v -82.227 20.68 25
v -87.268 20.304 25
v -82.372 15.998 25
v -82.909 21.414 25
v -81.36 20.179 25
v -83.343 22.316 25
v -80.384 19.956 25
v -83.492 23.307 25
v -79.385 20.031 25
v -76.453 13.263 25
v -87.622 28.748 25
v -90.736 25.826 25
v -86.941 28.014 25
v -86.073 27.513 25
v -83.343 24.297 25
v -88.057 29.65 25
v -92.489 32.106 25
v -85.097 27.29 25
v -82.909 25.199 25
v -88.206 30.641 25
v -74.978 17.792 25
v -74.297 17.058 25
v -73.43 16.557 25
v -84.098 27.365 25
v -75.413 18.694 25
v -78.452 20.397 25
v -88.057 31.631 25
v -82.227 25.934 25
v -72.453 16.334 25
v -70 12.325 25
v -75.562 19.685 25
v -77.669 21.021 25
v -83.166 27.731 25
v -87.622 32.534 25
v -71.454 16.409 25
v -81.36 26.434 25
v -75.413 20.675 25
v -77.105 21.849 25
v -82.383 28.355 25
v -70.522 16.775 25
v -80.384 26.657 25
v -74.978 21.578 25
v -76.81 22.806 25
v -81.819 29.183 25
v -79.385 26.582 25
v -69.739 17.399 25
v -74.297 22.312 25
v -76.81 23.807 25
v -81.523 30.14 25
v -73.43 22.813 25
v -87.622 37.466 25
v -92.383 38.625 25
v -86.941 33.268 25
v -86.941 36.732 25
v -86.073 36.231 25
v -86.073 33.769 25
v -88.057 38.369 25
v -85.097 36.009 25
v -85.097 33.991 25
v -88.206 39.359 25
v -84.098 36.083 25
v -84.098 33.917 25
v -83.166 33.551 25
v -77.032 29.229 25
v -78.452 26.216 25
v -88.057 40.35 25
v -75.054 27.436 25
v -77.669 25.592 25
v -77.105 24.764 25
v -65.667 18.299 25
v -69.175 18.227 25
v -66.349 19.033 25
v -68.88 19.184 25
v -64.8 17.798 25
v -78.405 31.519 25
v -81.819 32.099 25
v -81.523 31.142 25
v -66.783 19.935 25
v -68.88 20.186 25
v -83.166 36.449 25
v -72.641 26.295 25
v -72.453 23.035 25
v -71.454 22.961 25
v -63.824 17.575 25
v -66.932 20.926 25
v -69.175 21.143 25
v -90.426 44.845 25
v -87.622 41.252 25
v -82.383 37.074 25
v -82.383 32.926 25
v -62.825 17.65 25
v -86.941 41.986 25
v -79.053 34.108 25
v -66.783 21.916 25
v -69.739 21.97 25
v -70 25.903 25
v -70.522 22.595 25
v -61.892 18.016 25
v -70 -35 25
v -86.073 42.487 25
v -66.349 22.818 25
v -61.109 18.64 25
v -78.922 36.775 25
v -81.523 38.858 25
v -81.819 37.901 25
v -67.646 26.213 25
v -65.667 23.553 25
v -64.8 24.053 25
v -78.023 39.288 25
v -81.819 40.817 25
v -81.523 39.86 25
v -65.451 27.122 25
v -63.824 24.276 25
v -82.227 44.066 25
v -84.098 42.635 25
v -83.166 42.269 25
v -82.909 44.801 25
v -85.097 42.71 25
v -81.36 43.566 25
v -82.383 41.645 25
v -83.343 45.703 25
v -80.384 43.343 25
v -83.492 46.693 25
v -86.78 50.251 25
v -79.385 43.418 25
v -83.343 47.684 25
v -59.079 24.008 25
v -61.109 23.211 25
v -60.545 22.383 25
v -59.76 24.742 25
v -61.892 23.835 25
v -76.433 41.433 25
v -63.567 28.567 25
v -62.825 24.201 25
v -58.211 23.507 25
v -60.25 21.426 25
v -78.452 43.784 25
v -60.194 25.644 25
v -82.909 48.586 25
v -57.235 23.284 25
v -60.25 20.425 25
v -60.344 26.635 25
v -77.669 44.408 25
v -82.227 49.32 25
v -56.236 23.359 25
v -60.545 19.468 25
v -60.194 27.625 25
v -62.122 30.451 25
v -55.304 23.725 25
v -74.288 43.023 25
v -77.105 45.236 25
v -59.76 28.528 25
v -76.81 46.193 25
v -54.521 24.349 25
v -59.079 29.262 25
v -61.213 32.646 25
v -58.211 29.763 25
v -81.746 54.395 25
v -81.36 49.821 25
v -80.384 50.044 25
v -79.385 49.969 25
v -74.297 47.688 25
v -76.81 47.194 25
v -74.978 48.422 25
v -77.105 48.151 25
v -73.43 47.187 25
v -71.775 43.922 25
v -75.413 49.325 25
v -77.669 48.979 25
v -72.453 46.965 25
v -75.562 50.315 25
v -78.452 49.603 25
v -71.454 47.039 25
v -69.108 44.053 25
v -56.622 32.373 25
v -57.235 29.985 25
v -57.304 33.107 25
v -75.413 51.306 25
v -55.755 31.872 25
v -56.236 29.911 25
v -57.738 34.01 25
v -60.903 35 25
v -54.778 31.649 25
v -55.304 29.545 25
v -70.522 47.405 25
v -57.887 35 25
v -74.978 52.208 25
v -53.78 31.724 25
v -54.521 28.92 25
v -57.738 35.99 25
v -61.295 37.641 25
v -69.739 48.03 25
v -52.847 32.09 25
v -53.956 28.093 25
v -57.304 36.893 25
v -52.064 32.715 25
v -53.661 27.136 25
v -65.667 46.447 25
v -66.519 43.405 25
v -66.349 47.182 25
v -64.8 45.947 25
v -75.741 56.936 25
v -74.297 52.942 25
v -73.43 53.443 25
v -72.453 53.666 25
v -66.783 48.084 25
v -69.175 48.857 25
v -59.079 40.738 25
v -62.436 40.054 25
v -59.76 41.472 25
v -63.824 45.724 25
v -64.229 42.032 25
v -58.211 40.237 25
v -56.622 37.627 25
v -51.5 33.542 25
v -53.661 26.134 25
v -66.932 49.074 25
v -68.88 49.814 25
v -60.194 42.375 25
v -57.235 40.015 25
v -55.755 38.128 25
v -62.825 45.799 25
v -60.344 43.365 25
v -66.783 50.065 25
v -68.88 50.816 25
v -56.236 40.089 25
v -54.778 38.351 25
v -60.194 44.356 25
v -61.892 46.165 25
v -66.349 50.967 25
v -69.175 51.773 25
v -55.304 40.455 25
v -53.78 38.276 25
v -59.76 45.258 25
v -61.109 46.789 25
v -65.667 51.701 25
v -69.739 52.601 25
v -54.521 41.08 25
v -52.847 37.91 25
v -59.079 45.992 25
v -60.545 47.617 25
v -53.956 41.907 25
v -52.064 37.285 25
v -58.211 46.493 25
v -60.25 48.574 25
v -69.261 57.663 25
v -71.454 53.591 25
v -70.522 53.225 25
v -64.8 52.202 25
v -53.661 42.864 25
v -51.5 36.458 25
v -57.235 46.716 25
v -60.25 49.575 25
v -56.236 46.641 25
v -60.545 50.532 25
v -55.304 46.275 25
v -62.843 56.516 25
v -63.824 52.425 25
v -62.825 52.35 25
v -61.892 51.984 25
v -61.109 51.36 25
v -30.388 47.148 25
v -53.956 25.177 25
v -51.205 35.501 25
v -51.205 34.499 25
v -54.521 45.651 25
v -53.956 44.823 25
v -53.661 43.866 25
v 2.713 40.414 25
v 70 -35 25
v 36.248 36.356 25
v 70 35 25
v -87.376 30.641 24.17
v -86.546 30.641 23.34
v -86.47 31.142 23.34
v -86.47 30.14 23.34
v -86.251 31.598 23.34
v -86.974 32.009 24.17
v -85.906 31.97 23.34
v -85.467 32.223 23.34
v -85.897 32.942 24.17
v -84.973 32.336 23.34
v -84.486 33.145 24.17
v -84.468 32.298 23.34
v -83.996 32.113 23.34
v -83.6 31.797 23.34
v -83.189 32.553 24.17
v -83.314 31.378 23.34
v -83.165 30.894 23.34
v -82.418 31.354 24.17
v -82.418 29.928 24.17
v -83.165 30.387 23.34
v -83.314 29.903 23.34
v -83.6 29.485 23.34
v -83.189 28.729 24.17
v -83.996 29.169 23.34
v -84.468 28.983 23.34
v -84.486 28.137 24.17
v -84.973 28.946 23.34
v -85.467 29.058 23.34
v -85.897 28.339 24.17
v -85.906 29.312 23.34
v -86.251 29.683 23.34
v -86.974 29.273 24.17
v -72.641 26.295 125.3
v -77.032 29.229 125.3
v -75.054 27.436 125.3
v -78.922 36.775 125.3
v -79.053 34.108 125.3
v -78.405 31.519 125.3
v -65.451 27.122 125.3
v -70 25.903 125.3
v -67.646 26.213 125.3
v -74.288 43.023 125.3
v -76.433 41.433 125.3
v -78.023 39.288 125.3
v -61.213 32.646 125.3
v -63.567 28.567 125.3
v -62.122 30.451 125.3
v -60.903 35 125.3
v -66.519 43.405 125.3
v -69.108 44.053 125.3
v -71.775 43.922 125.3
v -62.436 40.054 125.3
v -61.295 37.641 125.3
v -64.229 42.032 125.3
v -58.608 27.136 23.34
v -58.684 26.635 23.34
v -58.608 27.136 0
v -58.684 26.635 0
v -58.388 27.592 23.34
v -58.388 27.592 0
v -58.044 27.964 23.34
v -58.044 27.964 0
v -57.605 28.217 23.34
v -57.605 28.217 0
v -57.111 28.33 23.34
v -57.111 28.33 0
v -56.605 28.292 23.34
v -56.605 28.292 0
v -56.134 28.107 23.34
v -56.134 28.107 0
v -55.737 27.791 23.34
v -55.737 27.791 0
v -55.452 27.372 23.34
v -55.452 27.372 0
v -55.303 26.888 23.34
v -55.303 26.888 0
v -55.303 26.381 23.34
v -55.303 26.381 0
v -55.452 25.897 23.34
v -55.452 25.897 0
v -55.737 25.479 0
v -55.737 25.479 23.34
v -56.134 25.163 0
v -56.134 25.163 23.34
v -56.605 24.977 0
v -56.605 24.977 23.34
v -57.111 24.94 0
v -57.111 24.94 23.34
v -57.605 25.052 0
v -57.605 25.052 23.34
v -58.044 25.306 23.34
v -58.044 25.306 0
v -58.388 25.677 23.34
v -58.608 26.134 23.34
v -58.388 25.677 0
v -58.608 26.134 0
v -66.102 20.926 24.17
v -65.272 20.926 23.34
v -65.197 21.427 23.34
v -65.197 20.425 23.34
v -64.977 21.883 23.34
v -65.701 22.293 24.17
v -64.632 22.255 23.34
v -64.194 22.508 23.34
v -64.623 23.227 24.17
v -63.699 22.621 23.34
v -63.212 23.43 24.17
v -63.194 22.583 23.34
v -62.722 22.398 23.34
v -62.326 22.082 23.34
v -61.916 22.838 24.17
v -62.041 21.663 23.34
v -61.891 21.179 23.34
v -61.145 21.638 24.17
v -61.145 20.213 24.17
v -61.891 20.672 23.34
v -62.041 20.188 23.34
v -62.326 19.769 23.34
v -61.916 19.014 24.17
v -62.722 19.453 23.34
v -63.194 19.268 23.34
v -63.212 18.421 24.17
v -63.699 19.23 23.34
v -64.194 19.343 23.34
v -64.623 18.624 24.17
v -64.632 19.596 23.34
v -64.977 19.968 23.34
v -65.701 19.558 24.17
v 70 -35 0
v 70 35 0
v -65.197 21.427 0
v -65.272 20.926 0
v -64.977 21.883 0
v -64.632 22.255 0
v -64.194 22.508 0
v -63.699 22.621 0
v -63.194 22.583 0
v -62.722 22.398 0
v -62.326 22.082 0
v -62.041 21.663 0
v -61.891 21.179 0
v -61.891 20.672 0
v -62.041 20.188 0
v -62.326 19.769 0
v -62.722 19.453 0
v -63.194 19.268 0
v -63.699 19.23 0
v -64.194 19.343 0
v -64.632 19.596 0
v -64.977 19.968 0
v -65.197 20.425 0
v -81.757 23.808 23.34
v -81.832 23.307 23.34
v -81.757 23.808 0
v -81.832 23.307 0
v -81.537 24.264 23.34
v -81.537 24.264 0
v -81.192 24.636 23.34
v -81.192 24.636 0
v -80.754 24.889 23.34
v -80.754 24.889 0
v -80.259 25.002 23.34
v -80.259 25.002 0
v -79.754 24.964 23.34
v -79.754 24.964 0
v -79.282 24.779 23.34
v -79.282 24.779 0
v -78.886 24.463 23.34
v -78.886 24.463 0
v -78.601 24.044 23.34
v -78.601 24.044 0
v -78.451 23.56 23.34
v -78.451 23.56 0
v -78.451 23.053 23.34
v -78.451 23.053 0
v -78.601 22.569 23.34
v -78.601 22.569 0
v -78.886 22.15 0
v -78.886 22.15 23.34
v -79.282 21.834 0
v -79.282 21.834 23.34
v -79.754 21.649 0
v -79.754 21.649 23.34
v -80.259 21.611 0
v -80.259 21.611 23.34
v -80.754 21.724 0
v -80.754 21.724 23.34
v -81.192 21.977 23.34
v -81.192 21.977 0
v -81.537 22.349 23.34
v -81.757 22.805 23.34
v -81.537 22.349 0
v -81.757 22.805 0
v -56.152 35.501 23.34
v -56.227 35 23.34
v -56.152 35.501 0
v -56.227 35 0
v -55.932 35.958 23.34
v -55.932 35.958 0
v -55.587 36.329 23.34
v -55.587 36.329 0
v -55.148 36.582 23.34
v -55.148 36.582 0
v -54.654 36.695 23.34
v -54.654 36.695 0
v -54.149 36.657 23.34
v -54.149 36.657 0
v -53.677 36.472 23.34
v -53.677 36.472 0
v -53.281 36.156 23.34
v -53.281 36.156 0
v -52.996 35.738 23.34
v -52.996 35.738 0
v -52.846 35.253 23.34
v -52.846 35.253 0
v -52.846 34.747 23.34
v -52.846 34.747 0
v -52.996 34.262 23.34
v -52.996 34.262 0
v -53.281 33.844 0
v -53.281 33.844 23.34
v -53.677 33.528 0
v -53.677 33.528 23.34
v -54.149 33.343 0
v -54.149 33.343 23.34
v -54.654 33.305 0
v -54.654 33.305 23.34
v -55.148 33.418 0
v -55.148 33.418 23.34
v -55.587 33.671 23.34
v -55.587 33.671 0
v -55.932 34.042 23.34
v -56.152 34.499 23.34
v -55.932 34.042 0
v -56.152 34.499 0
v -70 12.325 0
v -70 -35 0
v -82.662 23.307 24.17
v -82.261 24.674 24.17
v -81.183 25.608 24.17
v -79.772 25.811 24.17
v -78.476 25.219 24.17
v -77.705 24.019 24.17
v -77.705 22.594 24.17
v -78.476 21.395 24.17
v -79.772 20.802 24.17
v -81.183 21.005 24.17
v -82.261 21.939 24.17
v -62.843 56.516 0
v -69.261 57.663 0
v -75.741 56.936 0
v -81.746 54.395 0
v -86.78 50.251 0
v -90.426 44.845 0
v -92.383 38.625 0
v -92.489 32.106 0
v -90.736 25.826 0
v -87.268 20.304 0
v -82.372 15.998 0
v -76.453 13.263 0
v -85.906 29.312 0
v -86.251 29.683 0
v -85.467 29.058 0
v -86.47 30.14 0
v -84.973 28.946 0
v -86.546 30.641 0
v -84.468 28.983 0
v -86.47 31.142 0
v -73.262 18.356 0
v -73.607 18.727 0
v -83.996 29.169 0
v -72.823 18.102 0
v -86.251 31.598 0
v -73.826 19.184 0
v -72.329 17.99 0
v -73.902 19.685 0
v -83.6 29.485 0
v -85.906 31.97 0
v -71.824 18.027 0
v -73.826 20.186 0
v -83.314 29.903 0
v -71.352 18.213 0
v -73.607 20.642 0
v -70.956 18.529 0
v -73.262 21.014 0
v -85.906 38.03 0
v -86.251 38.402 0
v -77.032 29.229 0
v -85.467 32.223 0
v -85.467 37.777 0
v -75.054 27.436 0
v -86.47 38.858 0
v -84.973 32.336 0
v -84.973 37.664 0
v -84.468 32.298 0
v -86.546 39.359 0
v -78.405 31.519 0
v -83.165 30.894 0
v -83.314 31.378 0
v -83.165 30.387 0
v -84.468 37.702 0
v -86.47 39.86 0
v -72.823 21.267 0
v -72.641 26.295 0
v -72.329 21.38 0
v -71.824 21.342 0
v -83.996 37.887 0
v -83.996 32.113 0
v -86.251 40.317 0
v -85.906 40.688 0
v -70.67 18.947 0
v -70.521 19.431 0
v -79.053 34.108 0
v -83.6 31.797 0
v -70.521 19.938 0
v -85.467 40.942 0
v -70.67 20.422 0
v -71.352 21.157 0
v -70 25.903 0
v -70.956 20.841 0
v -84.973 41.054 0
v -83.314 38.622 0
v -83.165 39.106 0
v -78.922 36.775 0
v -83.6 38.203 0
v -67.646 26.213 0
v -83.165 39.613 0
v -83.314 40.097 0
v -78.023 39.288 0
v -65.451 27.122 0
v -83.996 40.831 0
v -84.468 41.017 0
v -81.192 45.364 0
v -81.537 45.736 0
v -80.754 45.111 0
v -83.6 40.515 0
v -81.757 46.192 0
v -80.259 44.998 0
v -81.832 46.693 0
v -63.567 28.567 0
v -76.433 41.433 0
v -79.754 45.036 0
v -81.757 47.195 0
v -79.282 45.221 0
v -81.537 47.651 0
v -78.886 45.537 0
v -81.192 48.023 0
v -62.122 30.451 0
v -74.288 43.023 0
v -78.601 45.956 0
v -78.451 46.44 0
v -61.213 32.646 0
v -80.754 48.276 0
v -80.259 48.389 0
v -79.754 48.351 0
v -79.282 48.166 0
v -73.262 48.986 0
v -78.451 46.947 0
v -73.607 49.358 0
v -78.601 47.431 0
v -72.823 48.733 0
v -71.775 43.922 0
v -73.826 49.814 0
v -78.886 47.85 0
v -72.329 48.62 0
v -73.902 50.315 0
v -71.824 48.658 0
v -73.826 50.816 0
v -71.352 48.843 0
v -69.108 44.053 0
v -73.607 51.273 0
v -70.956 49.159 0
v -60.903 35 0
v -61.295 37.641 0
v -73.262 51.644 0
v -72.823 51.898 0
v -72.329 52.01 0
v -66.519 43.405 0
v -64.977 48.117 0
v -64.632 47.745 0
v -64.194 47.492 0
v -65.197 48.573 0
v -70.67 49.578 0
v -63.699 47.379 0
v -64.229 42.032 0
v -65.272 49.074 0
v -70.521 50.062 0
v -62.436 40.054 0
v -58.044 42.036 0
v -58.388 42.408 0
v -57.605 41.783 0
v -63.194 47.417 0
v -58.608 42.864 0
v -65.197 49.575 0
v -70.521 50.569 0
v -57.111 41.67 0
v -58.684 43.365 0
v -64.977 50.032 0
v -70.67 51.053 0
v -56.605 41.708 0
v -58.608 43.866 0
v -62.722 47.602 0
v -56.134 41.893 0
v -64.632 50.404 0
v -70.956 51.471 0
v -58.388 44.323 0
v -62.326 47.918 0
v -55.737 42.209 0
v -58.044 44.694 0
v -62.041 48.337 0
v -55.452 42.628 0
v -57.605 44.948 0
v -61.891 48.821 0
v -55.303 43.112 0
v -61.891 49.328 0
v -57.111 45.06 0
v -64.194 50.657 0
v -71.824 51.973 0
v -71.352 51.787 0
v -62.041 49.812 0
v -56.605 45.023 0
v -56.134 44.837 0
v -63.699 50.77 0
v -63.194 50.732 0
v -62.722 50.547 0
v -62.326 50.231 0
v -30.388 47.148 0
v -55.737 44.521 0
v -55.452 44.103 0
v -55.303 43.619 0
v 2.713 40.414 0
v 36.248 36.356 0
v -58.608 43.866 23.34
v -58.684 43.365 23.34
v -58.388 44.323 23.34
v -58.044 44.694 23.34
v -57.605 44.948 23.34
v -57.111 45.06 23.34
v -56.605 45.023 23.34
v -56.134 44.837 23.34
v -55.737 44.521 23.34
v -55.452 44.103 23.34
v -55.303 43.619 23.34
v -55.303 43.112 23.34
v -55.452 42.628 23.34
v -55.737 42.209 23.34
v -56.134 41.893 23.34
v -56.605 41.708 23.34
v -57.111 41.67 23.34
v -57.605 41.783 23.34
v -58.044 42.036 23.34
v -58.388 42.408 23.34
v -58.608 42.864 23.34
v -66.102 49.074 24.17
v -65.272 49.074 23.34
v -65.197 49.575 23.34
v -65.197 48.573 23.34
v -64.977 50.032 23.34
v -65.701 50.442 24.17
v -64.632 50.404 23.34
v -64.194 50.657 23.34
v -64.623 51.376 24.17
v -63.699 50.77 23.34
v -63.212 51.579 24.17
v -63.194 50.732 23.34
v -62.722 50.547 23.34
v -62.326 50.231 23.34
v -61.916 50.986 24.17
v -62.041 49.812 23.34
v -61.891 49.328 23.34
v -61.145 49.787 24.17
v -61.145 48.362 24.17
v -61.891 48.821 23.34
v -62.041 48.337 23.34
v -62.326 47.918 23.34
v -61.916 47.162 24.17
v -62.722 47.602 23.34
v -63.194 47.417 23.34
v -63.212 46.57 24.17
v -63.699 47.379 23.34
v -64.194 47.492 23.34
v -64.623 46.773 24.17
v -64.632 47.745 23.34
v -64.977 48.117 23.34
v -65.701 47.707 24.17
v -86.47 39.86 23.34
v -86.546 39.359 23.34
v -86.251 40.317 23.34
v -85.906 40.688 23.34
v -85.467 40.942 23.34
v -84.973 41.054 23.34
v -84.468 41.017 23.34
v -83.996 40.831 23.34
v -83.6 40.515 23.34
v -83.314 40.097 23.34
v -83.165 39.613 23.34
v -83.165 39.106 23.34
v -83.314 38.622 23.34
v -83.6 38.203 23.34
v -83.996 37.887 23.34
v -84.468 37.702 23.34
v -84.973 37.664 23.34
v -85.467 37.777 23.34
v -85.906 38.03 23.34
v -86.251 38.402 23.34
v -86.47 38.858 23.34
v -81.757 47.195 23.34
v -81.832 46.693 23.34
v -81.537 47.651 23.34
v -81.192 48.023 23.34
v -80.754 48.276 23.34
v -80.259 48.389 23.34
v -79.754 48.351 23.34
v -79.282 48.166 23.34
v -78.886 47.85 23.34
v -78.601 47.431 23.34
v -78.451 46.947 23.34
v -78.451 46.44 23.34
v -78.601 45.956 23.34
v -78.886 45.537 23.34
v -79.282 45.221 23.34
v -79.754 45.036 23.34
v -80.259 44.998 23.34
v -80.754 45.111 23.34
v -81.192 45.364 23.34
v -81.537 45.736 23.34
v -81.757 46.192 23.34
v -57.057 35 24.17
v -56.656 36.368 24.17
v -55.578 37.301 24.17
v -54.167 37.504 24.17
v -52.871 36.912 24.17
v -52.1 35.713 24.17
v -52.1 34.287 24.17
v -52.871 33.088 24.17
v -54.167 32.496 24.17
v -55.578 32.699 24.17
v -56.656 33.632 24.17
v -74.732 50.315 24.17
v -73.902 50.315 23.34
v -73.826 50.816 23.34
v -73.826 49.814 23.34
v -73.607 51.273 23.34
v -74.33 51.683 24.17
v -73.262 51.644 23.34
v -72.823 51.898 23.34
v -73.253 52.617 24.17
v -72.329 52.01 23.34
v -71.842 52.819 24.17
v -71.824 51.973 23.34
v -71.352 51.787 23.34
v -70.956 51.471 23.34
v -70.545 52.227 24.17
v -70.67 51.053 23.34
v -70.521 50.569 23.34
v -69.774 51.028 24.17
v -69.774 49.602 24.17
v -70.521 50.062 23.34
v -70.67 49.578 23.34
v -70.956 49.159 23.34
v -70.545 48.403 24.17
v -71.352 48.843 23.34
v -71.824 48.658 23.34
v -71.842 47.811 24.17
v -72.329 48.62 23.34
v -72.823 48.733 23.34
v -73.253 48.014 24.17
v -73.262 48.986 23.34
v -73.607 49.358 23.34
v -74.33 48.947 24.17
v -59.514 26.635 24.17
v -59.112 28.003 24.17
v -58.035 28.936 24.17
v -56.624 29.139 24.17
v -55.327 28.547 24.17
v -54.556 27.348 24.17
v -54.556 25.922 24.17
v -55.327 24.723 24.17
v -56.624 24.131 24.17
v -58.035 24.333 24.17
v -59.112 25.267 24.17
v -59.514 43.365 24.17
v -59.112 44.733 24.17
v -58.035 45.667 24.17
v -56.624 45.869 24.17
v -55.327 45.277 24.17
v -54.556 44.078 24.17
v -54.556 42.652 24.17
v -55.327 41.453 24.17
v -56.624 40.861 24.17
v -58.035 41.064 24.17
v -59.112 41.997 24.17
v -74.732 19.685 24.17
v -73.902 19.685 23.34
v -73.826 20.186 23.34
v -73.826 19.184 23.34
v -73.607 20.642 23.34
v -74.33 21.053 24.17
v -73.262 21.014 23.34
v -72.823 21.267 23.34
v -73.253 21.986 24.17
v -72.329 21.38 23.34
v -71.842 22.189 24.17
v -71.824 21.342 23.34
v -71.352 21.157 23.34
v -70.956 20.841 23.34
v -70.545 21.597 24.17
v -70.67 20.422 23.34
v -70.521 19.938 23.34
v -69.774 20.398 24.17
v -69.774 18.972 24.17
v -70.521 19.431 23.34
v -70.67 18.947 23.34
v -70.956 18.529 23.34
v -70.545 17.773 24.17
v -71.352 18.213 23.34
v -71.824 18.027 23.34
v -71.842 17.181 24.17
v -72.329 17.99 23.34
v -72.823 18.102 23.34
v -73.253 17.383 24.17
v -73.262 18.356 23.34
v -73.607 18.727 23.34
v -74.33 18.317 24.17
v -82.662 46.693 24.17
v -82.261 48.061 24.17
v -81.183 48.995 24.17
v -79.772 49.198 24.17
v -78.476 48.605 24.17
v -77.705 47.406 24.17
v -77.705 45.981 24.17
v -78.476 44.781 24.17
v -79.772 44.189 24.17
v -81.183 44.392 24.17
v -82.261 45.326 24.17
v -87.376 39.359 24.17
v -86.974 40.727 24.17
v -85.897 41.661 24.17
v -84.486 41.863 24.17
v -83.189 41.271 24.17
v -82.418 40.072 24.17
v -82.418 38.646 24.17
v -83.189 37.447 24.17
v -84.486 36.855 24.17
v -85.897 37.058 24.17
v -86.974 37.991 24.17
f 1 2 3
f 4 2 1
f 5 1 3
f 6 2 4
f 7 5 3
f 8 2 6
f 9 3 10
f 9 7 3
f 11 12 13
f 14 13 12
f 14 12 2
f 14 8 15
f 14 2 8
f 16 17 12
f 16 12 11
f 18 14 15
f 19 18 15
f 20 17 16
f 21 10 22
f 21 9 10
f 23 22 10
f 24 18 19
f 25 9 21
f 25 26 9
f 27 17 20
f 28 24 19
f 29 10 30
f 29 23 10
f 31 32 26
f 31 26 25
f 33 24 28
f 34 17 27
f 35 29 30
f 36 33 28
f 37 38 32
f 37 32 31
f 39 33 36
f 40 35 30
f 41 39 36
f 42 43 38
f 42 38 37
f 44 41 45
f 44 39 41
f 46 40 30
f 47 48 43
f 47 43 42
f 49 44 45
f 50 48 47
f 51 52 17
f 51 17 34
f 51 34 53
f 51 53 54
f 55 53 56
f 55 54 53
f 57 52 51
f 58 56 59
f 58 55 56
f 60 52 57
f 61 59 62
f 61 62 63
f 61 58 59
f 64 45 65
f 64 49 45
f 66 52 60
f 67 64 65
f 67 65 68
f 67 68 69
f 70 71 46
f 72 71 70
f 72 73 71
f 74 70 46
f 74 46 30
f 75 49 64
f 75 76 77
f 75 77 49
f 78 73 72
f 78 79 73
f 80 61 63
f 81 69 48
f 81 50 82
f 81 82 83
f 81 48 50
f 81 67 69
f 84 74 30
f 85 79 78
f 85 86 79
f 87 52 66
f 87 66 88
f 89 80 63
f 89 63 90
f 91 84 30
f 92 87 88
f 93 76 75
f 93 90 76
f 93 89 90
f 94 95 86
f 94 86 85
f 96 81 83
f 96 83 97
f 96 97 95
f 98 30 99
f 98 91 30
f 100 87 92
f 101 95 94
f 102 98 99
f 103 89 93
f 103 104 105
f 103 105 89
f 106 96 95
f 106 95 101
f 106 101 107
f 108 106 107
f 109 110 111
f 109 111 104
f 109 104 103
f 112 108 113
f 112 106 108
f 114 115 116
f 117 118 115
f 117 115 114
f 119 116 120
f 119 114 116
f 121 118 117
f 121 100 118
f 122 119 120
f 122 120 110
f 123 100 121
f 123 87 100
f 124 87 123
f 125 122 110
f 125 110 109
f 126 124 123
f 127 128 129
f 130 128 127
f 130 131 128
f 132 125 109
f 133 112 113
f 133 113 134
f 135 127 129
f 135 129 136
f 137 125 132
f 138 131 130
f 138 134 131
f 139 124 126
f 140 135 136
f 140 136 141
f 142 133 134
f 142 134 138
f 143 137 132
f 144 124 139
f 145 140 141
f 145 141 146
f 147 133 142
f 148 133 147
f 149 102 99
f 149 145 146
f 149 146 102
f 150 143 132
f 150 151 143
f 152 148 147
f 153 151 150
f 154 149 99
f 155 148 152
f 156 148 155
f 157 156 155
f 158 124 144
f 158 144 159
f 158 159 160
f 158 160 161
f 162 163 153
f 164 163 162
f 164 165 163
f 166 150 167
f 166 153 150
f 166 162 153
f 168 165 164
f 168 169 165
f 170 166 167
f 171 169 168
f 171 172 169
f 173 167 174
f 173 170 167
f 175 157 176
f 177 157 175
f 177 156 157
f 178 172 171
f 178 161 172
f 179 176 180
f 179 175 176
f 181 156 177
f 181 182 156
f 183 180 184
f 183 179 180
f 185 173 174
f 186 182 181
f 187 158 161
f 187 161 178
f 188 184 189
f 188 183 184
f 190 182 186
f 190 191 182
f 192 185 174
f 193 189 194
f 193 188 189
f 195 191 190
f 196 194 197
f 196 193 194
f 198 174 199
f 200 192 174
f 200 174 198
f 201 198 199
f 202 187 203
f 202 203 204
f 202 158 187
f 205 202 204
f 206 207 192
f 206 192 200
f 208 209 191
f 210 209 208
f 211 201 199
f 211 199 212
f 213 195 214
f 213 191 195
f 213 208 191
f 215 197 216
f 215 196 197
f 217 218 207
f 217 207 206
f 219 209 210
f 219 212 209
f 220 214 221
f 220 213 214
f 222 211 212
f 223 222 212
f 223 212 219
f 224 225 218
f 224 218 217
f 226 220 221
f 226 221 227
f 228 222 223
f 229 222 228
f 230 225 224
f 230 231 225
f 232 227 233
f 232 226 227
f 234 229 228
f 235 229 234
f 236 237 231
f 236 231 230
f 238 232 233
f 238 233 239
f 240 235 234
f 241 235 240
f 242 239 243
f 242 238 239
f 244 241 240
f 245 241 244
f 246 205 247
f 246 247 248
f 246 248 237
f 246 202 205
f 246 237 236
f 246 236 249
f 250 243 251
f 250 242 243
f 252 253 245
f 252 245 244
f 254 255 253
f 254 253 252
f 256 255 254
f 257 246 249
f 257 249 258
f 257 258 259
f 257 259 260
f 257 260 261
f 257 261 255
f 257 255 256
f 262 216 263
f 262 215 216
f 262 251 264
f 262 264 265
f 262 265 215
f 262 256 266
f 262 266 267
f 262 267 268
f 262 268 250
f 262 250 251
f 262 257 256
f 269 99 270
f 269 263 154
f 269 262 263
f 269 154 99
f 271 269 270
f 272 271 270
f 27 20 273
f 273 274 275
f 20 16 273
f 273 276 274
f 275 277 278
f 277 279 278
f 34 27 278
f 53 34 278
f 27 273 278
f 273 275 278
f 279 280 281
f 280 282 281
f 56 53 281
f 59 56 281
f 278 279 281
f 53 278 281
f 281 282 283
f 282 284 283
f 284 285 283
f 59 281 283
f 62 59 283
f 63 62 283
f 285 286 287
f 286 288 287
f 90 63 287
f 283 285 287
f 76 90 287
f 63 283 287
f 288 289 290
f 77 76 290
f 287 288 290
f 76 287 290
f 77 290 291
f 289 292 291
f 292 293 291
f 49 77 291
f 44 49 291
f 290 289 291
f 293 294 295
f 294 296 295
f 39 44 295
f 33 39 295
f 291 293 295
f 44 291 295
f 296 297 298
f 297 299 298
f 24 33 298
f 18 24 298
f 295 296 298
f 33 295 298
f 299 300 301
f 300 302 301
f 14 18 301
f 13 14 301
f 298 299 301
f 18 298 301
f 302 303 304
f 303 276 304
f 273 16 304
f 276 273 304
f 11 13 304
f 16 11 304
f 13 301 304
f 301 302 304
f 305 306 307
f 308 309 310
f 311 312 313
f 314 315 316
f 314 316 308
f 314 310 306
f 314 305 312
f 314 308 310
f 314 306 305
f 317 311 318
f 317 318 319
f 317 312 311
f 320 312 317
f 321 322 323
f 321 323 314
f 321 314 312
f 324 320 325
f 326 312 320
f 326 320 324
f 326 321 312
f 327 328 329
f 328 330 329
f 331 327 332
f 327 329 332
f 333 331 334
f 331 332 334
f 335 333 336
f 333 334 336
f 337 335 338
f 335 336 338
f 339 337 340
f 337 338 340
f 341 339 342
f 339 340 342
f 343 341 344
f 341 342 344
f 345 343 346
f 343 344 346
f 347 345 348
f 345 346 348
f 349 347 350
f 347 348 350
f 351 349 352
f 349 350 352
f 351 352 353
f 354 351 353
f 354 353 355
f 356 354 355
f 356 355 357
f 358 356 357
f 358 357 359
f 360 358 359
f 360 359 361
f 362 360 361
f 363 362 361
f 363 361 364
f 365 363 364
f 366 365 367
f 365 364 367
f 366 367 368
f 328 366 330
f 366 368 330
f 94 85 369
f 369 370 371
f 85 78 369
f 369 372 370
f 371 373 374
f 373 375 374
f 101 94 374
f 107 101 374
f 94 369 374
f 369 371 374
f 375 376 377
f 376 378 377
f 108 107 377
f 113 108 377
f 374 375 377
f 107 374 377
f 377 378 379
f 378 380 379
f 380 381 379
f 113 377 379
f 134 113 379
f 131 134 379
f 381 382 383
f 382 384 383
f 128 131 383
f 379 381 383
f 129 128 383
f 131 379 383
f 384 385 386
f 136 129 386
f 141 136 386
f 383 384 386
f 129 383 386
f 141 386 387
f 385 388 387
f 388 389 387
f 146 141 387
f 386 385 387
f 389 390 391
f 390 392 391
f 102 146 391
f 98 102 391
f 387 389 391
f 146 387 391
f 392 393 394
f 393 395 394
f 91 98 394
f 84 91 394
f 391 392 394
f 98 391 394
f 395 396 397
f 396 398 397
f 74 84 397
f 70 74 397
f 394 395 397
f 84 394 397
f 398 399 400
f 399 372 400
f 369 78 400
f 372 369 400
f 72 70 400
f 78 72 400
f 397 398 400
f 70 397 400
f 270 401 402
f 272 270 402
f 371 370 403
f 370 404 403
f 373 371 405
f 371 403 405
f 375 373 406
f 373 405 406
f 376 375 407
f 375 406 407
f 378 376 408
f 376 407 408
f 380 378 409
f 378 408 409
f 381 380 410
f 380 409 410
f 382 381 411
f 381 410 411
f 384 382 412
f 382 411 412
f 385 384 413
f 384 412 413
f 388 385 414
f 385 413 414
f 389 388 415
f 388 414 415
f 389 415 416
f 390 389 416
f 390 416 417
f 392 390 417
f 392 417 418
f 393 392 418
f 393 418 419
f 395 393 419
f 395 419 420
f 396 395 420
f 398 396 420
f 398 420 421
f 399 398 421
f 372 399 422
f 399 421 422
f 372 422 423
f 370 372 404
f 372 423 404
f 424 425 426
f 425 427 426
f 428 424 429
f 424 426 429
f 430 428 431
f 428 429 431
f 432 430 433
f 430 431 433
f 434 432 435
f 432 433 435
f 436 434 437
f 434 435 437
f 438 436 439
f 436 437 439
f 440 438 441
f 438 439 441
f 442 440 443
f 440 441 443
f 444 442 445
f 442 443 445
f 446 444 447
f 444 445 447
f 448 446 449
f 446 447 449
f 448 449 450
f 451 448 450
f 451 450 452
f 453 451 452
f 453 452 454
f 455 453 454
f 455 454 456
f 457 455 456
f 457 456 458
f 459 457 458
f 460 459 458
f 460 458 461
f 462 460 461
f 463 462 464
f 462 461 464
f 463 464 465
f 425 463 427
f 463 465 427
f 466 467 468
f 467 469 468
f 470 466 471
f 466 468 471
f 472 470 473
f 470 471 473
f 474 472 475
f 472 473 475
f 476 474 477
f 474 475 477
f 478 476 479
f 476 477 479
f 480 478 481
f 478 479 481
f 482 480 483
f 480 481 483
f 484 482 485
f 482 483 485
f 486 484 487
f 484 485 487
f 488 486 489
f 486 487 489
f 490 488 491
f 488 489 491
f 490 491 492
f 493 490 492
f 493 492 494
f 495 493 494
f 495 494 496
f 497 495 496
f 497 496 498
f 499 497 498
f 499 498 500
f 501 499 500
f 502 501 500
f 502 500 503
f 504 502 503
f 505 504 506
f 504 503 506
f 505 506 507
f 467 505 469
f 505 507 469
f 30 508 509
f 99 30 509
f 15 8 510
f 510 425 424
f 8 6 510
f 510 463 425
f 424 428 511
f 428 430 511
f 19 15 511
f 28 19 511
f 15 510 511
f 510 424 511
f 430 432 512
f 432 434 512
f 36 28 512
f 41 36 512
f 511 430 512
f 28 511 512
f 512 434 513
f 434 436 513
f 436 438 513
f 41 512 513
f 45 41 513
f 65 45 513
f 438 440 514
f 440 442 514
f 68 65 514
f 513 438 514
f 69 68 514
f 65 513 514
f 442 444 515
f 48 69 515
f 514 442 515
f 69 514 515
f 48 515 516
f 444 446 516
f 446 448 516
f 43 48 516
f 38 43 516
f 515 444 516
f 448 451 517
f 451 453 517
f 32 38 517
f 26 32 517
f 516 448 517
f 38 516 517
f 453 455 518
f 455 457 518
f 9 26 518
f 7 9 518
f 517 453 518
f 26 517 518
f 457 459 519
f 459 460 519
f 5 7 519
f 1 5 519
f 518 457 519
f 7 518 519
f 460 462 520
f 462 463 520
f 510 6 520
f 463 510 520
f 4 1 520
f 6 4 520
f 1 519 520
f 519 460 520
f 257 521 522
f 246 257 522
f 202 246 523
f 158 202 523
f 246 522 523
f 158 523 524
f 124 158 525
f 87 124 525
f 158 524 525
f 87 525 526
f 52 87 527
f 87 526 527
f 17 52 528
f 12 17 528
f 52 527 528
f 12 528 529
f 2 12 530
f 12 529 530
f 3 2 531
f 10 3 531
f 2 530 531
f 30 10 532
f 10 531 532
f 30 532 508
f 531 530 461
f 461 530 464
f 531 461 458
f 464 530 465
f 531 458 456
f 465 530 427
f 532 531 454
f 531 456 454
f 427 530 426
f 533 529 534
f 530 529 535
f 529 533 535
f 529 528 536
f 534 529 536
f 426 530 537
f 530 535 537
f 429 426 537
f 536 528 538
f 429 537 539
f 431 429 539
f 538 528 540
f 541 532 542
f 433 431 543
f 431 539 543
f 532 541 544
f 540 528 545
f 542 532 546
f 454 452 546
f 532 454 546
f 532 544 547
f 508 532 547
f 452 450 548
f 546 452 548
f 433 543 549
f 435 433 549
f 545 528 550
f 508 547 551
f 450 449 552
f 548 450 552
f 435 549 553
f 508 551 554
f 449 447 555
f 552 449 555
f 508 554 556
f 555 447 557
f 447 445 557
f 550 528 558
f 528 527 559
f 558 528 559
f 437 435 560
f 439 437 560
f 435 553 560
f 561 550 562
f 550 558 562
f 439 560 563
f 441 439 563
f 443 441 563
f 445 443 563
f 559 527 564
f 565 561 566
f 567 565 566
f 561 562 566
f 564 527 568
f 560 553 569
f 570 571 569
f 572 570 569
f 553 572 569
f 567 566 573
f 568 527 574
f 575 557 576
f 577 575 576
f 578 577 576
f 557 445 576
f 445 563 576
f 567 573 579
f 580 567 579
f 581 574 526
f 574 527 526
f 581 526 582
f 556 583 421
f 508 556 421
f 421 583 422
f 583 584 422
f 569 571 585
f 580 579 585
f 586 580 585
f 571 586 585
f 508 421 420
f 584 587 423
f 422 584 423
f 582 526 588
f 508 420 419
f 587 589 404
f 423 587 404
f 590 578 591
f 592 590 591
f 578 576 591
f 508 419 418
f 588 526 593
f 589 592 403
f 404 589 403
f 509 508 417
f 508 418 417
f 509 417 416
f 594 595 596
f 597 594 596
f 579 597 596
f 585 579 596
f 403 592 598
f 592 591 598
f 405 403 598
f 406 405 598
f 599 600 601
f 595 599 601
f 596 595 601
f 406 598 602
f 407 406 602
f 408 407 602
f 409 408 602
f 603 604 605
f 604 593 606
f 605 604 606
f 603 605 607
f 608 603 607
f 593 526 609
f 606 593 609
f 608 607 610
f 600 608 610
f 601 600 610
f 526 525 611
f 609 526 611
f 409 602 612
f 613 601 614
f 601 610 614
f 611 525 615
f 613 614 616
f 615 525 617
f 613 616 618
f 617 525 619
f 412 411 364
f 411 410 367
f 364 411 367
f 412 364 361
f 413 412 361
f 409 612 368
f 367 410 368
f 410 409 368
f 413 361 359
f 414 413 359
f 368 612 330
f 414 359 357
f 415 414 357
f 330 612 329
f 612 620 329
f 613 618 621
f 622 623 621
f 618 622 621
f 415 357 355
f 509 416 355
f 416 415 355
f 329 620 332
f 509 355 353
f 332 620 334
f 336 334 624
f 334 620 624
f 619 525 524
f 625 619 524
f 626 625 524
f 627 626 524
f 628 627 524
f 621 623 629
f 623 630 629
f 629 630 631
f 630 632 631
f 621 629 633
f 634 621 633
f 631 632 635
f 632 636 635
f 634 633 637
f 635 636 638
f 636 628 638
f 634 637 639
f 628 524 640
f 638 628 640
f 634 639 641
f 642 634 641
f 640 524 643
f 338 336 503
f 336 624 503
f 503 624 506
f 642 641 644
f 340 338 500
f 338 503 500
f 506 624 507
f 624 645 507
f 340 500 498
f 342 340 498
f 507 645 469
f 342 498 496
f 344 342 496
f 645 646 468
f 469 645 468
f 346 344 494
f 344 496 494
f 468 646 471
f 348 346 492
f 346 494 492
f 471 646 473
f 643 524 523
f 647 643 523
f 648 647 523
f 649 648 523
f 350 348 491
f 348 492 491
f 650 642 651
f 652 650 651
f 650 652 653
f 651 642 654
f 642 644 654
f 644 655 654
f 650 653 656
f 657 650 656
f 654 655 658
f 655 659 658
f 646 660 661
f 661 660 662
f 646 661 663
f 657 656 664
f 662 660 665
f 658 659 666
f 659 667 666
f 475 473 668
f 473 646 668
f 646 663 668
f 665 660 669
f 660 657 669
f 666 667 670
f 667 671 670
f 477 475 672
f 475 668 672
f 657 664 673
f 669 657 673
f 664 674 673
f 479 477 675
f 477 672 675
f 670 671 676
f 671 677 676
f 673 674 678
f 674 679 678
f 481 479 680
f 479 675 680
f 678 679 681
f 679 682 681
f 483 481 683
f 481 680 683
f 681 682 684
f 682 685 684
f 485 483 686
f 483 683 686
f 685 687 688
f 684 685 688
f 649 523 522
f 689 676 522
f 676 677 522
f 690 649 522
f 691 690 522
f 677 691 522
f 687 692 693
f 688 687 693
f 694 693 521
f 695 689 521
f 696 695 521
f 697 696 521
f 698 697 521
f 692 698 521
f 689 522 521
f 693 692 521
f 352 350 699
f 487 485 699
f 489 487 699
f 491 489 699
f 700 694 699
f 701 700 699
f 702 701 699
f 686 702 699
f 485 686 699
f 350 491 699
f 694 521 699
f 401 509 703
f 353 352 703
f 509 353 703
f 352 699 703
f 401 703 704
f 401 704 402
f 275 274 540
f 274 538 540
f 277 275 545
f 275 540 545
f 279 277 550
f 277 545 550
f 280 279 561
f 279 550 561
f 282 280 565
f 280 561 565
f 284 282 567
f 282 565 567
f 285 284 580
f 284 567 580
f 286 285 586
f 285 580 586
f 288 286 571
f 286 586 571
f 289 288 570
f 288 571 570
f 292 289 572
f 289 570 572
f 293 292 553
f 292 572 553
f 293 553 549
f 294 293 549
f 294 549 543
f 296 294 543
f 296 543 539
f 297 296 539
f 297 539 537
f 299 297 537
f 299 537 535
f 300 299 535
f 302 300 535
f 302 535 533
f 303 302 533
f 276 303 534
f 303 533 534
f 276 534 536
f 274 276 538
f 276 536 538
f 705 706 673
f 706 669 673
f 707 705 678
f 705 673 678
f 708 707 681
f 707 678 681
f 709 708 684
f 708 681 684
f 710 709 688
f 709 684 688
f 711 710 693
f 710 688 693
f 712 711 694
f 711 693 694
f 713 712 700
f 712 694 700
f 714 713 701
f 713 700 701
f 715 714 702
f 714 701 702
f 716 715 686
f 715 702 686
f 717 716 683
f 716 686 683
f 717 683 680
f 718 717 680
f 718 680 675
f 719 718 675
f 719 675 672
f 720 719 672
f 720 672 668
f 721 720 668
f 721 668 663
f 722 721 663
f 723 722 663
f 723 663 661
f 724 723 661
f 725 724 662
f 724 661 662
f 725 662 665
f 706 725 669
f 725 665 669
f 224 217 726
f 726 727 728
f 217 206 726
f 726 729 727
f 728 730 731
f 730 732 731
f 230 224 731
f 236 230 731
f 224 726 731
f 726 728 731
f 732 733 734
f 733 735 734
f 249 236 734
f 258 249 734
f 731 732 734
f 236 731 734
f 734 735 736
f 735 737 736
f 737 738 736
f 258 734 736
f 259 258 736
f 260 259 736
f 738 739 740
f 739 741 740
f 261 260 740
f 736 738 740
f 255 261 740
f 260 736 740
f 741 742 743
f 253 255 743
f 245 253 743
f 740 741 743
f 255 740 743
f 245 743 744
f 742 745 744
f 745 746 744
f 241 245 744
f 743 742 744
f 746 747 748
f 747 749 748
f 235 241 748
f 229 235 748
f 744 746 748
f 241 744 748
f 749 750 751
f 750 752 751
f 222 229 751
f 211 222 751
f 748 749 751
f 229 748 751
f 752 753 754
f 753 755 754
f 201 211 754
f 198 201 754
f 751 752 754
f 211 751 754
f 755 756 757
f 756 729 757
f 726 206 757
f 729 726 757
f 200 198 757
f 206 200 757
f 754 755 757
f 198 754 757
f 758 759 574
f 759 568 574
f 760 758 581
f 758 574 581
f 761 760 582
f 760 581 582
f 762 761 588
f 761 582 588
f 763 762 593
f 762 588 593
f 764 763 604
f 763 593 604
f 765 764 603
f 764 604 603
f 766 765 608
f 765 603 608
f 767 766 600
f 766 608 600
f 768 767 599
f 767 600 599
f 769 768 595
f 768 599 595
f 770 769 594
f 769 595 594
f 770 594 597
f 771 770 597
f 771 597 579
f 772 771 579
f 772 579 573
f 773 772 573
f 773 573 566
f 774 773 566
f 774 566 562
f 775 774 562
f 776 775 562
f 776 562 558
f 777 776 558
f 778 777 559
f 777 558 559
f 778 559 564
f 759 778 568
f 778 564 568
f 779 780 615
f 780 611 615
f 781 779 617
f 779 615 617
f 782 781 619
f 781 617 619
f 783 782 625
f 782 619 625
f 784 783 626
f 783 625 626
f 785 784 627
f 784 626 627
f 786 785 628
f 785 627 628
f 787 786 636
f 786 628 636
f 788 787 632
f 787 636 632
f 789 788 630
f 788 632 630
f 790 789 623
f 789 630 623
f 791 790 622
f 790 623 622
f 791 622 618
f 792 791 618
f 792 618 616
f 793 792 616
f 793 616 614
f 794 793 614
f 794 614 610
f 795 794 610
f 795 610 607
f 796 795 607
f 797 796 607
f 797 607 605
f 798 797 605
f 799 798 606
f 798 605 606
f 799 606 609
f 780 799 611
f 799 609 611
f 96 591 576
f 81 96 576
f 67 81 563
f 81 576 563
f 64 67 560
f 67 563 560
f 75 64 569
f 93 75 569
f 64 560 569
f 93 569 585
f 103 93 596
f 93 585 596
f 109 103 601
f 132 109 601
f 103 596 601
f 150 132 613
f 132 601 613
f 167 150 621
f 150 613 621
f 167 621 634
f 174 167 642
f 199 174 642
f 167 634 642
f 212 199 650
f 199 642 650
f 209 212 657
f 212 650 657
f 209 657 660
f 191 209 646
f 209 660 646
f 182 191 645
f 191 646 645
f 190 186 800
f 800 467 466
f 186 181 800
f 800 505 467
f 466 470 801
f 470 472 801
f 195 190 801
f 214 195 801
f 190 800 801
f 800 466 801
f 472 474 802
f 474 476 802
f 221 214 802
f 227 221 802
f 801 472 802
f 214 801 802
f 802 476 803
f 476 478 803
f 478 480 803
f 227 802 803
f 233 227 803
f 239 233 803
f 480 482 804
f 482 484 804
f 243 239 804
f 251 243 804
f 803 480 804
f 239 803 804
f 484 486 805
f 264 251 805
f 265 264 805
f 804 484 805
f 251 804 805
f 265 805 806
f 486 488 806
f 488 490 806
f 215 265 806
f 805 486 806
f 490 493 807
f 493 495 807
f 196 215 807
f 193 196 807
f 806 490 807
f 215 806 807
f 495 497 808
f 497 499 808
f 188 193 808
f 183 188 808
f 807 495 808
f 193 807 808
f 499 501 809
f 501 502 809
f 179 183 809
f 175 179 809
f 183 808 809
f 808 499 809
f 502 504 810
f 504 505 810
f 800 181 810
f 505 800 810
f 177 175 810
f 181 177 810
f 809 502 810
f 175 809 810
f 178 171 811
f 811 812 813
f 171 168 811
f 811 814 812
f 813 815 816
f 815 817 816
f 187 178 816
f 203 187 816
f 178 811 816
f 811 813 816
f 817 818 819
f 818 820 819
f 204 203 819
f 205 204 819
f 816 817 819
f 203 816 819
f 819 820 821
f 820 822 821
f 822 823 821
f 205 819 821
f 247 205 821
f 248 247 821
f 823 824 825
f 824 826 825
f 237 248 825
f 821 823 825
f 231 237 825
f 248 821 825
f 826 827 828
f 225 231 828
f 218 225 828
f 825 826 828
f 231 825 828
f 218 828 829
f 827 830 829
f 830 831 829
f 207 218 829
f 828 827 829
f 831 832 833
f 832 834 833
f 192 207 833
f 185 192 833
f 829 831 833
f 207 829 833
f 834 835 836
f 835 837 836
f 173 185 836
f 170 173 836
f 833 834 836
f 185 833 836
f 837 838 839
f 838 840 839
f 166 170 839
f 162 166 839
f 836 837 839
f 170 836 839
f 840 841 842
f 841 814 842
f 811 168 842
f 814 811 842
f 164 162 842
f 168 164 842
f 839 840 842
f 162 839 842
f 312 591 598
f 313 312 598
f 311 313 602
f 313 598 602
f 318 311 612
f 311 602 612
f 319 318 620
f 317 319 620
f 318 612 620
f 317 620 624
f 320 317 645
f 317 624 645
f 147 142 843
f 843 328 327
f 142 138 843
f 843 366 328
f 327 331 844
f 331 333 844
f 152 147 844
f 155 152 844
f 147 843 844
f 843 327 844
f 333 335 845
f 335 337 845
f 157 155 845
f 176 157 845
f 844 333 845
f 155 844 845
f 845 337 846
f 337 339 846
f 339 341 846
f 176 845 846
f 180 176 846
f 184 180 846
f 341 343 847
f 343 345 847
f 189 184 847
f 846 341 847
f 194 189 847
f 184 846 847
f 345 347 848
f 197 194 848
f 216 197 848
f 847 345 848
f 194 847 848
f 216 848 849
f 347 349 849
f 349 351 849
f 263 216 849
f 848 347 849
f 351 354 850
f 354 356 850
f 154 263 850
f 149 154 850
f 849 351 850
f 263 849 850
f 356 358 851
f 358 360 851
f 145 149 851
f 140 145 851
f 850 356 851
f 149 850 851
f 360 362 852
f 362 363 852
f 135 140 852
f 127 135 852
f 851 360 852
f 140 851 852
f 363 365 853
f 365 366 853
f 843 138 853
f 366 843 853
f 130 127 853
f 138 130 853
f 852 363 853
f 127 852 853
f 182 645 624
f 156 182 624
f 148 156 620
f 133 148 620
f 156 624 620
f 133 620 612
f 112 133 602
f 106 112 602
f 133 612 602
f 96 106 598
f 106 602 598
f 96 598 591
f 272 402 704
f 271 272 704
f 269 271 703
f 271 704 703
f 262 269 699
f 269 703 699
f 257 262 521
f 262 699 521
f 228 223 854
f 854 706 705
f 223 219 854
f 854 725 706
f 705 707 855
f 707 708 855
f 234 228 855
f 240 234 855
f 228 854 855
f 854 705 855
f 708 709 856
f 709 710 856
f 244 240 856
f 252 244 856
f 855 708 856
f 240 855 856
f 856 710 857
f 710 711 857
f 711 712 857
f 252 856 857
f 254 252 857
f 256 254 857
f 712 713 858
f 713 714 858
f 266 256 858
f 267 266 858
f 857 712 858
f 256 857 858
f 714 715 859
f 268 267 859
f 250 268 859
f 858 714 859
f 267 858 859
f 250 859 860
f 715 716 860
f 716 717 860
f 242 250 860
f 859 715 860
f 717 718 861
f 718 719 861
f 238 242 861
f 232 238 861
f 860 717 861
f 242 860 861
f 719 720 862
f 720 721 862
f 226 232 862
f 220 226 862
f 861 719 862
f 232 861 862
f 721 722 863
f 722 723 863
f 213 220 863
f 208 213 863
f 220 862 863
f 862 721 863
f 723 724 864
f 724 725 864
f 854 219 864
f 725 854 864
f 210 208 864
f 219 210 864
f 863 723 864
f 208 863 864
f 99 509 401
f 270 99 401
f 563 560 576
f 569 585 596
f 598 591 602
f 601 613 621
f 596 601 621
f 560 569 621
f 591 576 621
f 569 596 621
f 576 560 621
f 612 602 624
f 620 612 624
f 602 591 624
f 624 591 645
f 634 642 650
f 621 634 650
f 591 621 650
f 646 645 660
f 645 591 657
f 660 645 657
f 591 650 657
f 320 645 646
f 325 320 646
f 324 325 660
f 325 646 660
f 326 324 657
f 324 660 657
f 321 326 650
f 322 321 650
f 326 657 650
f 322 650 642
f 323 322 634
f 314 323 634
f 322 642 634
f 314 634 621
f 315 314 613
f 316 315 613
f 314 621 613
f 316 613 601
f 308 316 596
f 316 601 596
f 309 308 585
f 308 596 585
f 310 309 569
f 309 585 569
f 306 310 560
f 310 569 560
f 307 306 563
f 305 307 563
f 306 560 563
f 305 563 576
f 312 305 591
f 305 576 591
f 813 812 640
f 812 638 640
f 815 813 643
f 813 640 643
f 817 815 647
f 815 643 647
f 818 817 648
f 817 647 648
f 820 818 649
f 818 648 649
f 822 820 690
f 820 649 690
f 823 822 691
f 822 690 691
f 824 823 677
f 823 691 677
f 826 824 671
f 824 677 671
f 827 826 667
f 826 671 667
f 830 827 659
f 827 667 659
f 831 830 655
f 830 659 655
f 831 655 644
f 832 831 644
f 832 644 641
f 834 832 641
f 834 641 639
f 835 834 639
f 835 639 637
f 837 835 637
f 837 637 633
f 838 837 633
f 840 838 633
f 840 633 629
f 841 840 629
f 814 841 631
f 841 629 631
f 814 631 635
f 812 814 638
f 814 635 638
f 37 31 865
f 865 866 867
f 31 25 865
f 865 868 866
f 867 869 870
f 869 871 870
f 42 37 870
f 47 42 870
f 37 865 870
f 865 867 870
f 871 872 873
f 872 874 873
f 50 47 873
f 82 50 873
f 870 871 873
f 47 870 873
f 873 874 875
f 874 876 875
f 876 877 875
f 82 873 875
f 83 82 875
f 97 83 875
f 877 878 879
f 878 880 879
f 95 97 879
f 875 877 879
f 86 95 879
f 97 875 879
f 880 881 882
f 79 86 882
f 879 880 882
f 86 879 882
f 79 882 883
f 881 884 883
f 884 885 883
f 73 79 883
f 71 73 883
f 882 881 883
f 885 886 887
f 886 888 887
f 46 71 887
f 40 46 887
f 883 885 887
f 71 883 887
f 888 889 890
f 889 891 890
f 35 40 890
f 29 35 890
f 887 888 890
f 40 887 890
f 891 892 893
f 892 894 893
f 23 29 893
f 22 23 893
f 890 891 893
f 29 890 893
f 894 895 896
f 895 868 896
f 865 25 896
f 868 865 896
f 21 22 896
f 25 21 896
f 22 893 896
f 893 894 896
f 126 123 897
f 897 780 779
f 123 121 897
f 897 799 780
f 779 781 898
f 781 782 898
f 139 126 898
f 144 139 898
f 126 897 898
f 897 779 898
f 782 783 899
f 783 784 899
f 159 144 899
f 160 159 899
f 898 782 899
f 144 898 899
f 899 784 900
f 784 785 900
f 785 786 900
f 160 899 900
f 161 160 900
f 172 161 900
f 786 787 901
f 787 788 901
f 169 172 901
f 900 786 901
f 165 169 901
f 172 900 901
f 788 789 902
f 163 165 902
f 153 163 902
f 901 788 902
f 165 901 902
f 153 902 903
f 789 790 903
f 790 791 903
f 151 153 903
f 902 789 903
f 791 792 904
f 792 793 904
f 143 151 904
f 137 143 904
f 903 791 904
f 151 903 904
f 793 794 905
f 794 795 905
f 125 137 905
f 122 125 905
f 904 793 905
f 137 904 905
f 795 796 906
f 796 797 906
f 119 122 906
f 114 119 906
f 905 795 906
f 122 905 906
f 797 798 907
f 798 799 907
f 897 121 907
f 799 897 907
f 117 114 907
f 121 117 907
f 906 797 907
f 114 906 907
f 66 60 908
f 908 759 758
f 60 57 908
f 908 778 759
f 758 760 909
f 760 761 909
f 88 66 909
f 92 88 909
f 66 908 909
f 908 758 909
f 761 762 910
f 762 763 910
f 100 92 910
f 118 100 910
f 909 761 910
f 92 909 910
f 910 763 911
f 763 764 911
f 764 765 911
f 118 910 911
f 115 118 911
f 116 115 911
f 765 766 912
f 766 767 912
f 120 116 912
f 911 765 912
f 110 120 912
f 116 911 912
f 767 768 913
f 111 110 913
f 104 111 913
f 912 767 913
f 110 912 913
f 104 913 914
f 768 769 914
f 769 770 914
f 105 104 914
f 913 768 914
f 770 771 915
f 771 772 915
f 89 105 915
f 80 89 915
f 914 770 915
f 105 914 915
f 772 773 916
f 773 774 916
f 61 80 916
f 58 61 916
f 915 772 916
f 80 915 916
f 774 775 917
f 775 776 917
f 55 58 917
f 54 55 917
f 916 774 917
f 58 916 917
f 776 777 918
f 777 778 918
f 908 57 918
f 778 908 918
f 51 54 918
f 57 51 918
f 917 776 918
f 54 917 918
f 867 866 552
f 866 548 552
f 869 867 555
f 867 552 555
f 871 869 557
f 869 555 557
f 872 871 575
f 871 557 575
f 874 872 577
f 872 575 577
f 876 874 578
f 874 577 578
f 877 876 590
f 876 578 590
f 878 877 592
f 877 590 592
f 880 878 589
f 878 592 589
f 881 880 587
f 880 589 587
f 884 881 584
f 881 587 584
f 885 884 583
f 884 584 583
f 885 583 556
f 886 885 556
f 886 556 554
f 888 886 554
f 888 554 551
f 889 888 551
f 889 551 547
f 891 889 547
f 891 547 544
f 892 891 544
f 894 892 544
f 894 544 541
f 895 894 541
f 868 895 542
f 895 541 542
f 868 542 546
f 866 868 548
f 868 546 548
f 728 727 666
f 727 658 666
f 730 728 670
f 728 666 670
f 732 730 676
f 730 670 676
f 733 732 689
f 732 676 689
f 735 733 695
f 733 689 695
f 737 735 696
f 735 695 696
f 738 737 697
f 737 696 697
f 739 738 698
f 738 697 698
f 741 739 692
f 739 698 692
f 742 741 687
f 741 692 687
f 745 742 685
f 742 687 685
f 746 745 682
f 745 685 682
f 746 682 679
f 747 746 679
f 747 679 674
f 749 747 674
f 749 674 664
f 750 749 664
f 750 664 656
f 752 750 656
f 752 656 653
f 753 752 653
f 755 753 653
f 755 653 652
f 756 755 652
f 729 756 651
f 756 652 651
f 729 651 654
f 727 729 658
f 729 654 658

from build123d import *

# Parameters (mm, degrees)
F1_DEPTH       = 25
F2_DEPTH       = 125.3
F4_D           = 3.4
F4_CSINK_D     = 6.72
F4_CSINK_ANGLE = 90


with BuildPart() as f1:
    # F0 (on Top) → F1 (new body)
    with BuildSketch(Plane.XY):
        with BuildLine():
            ThreePointArc((-62.8427357979, 56.5156830348), (-92.3832190301, 38.6252659436), (-70, 12.3251009415))
            Line((-70, 12.3251009415), (-70, 25.9029745303))
            ThreePointArc((-70, 25.9029745303), (-76.4325683983, 41.4325683983), (-60.9029745303, 35))
            Line((-60.9029745303, 35), (-47.3251009415, 35))
            ThreePointArc((-47.3251009415, 35), (-51.6092239067, 48.2638758286), (-62.8427357979, 56.5156830348))
        make_face()
        with BuildLine():
            Line((-70, 25.9029745303), (-70, 12.3251009415))
            ThreePointArc((-70, 12.3251009415), (-53.966425113, 18.966425113), (-47.3251009415, 35))
            Line((-47.3251009415, 35), (-60.9029745303, 35))
            ThreePointArc((-60.9029745303, 35), (-63.5674316017, 28.5674316017), (-70, 25.9029745303))
        make_face()
        with BuildLine():
            Line((-70, -35), (70, -35))
            Line((70, -35), (70, 35))
            Line((70, 35), (-47.3251009415, 35))
            ThreePointArc((-47.3251009415, 35), (-53.966425113, 18.966425113), (-70, 12.3251009415))
            Line((-70, 12.3251009415), (-70, -35))
        make_face()
        with BuildLine():
            Line((-47.3251009415, 35), (70, 35))
            ThreePointArc((70, 35), (2.7130824924, 40.4137407606), (-62.8427357979, 56.5156830348))
            ThreePointArc((-62.8427357979, 56.5156830348), (-51.6092239067, 48.2638758286), (-47.3251009415, 35))
        make_face()
    extrude(amount=F1_DEPTH)

    # F4 (through all)
    with Locations(Plane.XY.offset(25)):
        with Locations((-72.201987185, 50.3151572729), (-63.5724303511, 49.0744143134), (-80.1324286461, 46.69344601), (-56.9835814657, 43.3651442545), (-54.5273534954, 35), (-56.9835814657, 26.6348557455), (-63.5724303511, 20.9255856866), (-72.201987185, 19.6848427271), (-80.1324286461, 23.30655399), (-84.8458956044, 30.6408517391), (-84.8458956044, 39.3591482609)):
            CounterSinkHole(F4_D / 2, F4_CSINK_D / 2, counter_sink_angle=F4_CSINK_ANGLE)


with BuildPart() as f2:
    # F0 (on Top) → F2 (new body)
    with BuildSketch(Plane.XY):
        with BuildLine():
            ThreePointArc((-60.9029745303, 35), (-76.4325683983, 41.4325683983), (-70, 25.9029745303))
            Line((-70, 25.9029745303), (-70, 35))
            Line((-70, 35), (-60.9029745303, 35))
        make_face()
        with BuildLine():
            Line((-70, 35), (-70, 25.9029745303))
            ThreePointArc((-70, 25.9029745303), (-63.5674316017, 28.5674316017), (-60.9029745303, 35))
            Line((-60.9029745303, 35), (-70, 35))
        make_face()
    extrude(amount=F2_DEPTH)


solid = Compound([f1.part, f2.part])
